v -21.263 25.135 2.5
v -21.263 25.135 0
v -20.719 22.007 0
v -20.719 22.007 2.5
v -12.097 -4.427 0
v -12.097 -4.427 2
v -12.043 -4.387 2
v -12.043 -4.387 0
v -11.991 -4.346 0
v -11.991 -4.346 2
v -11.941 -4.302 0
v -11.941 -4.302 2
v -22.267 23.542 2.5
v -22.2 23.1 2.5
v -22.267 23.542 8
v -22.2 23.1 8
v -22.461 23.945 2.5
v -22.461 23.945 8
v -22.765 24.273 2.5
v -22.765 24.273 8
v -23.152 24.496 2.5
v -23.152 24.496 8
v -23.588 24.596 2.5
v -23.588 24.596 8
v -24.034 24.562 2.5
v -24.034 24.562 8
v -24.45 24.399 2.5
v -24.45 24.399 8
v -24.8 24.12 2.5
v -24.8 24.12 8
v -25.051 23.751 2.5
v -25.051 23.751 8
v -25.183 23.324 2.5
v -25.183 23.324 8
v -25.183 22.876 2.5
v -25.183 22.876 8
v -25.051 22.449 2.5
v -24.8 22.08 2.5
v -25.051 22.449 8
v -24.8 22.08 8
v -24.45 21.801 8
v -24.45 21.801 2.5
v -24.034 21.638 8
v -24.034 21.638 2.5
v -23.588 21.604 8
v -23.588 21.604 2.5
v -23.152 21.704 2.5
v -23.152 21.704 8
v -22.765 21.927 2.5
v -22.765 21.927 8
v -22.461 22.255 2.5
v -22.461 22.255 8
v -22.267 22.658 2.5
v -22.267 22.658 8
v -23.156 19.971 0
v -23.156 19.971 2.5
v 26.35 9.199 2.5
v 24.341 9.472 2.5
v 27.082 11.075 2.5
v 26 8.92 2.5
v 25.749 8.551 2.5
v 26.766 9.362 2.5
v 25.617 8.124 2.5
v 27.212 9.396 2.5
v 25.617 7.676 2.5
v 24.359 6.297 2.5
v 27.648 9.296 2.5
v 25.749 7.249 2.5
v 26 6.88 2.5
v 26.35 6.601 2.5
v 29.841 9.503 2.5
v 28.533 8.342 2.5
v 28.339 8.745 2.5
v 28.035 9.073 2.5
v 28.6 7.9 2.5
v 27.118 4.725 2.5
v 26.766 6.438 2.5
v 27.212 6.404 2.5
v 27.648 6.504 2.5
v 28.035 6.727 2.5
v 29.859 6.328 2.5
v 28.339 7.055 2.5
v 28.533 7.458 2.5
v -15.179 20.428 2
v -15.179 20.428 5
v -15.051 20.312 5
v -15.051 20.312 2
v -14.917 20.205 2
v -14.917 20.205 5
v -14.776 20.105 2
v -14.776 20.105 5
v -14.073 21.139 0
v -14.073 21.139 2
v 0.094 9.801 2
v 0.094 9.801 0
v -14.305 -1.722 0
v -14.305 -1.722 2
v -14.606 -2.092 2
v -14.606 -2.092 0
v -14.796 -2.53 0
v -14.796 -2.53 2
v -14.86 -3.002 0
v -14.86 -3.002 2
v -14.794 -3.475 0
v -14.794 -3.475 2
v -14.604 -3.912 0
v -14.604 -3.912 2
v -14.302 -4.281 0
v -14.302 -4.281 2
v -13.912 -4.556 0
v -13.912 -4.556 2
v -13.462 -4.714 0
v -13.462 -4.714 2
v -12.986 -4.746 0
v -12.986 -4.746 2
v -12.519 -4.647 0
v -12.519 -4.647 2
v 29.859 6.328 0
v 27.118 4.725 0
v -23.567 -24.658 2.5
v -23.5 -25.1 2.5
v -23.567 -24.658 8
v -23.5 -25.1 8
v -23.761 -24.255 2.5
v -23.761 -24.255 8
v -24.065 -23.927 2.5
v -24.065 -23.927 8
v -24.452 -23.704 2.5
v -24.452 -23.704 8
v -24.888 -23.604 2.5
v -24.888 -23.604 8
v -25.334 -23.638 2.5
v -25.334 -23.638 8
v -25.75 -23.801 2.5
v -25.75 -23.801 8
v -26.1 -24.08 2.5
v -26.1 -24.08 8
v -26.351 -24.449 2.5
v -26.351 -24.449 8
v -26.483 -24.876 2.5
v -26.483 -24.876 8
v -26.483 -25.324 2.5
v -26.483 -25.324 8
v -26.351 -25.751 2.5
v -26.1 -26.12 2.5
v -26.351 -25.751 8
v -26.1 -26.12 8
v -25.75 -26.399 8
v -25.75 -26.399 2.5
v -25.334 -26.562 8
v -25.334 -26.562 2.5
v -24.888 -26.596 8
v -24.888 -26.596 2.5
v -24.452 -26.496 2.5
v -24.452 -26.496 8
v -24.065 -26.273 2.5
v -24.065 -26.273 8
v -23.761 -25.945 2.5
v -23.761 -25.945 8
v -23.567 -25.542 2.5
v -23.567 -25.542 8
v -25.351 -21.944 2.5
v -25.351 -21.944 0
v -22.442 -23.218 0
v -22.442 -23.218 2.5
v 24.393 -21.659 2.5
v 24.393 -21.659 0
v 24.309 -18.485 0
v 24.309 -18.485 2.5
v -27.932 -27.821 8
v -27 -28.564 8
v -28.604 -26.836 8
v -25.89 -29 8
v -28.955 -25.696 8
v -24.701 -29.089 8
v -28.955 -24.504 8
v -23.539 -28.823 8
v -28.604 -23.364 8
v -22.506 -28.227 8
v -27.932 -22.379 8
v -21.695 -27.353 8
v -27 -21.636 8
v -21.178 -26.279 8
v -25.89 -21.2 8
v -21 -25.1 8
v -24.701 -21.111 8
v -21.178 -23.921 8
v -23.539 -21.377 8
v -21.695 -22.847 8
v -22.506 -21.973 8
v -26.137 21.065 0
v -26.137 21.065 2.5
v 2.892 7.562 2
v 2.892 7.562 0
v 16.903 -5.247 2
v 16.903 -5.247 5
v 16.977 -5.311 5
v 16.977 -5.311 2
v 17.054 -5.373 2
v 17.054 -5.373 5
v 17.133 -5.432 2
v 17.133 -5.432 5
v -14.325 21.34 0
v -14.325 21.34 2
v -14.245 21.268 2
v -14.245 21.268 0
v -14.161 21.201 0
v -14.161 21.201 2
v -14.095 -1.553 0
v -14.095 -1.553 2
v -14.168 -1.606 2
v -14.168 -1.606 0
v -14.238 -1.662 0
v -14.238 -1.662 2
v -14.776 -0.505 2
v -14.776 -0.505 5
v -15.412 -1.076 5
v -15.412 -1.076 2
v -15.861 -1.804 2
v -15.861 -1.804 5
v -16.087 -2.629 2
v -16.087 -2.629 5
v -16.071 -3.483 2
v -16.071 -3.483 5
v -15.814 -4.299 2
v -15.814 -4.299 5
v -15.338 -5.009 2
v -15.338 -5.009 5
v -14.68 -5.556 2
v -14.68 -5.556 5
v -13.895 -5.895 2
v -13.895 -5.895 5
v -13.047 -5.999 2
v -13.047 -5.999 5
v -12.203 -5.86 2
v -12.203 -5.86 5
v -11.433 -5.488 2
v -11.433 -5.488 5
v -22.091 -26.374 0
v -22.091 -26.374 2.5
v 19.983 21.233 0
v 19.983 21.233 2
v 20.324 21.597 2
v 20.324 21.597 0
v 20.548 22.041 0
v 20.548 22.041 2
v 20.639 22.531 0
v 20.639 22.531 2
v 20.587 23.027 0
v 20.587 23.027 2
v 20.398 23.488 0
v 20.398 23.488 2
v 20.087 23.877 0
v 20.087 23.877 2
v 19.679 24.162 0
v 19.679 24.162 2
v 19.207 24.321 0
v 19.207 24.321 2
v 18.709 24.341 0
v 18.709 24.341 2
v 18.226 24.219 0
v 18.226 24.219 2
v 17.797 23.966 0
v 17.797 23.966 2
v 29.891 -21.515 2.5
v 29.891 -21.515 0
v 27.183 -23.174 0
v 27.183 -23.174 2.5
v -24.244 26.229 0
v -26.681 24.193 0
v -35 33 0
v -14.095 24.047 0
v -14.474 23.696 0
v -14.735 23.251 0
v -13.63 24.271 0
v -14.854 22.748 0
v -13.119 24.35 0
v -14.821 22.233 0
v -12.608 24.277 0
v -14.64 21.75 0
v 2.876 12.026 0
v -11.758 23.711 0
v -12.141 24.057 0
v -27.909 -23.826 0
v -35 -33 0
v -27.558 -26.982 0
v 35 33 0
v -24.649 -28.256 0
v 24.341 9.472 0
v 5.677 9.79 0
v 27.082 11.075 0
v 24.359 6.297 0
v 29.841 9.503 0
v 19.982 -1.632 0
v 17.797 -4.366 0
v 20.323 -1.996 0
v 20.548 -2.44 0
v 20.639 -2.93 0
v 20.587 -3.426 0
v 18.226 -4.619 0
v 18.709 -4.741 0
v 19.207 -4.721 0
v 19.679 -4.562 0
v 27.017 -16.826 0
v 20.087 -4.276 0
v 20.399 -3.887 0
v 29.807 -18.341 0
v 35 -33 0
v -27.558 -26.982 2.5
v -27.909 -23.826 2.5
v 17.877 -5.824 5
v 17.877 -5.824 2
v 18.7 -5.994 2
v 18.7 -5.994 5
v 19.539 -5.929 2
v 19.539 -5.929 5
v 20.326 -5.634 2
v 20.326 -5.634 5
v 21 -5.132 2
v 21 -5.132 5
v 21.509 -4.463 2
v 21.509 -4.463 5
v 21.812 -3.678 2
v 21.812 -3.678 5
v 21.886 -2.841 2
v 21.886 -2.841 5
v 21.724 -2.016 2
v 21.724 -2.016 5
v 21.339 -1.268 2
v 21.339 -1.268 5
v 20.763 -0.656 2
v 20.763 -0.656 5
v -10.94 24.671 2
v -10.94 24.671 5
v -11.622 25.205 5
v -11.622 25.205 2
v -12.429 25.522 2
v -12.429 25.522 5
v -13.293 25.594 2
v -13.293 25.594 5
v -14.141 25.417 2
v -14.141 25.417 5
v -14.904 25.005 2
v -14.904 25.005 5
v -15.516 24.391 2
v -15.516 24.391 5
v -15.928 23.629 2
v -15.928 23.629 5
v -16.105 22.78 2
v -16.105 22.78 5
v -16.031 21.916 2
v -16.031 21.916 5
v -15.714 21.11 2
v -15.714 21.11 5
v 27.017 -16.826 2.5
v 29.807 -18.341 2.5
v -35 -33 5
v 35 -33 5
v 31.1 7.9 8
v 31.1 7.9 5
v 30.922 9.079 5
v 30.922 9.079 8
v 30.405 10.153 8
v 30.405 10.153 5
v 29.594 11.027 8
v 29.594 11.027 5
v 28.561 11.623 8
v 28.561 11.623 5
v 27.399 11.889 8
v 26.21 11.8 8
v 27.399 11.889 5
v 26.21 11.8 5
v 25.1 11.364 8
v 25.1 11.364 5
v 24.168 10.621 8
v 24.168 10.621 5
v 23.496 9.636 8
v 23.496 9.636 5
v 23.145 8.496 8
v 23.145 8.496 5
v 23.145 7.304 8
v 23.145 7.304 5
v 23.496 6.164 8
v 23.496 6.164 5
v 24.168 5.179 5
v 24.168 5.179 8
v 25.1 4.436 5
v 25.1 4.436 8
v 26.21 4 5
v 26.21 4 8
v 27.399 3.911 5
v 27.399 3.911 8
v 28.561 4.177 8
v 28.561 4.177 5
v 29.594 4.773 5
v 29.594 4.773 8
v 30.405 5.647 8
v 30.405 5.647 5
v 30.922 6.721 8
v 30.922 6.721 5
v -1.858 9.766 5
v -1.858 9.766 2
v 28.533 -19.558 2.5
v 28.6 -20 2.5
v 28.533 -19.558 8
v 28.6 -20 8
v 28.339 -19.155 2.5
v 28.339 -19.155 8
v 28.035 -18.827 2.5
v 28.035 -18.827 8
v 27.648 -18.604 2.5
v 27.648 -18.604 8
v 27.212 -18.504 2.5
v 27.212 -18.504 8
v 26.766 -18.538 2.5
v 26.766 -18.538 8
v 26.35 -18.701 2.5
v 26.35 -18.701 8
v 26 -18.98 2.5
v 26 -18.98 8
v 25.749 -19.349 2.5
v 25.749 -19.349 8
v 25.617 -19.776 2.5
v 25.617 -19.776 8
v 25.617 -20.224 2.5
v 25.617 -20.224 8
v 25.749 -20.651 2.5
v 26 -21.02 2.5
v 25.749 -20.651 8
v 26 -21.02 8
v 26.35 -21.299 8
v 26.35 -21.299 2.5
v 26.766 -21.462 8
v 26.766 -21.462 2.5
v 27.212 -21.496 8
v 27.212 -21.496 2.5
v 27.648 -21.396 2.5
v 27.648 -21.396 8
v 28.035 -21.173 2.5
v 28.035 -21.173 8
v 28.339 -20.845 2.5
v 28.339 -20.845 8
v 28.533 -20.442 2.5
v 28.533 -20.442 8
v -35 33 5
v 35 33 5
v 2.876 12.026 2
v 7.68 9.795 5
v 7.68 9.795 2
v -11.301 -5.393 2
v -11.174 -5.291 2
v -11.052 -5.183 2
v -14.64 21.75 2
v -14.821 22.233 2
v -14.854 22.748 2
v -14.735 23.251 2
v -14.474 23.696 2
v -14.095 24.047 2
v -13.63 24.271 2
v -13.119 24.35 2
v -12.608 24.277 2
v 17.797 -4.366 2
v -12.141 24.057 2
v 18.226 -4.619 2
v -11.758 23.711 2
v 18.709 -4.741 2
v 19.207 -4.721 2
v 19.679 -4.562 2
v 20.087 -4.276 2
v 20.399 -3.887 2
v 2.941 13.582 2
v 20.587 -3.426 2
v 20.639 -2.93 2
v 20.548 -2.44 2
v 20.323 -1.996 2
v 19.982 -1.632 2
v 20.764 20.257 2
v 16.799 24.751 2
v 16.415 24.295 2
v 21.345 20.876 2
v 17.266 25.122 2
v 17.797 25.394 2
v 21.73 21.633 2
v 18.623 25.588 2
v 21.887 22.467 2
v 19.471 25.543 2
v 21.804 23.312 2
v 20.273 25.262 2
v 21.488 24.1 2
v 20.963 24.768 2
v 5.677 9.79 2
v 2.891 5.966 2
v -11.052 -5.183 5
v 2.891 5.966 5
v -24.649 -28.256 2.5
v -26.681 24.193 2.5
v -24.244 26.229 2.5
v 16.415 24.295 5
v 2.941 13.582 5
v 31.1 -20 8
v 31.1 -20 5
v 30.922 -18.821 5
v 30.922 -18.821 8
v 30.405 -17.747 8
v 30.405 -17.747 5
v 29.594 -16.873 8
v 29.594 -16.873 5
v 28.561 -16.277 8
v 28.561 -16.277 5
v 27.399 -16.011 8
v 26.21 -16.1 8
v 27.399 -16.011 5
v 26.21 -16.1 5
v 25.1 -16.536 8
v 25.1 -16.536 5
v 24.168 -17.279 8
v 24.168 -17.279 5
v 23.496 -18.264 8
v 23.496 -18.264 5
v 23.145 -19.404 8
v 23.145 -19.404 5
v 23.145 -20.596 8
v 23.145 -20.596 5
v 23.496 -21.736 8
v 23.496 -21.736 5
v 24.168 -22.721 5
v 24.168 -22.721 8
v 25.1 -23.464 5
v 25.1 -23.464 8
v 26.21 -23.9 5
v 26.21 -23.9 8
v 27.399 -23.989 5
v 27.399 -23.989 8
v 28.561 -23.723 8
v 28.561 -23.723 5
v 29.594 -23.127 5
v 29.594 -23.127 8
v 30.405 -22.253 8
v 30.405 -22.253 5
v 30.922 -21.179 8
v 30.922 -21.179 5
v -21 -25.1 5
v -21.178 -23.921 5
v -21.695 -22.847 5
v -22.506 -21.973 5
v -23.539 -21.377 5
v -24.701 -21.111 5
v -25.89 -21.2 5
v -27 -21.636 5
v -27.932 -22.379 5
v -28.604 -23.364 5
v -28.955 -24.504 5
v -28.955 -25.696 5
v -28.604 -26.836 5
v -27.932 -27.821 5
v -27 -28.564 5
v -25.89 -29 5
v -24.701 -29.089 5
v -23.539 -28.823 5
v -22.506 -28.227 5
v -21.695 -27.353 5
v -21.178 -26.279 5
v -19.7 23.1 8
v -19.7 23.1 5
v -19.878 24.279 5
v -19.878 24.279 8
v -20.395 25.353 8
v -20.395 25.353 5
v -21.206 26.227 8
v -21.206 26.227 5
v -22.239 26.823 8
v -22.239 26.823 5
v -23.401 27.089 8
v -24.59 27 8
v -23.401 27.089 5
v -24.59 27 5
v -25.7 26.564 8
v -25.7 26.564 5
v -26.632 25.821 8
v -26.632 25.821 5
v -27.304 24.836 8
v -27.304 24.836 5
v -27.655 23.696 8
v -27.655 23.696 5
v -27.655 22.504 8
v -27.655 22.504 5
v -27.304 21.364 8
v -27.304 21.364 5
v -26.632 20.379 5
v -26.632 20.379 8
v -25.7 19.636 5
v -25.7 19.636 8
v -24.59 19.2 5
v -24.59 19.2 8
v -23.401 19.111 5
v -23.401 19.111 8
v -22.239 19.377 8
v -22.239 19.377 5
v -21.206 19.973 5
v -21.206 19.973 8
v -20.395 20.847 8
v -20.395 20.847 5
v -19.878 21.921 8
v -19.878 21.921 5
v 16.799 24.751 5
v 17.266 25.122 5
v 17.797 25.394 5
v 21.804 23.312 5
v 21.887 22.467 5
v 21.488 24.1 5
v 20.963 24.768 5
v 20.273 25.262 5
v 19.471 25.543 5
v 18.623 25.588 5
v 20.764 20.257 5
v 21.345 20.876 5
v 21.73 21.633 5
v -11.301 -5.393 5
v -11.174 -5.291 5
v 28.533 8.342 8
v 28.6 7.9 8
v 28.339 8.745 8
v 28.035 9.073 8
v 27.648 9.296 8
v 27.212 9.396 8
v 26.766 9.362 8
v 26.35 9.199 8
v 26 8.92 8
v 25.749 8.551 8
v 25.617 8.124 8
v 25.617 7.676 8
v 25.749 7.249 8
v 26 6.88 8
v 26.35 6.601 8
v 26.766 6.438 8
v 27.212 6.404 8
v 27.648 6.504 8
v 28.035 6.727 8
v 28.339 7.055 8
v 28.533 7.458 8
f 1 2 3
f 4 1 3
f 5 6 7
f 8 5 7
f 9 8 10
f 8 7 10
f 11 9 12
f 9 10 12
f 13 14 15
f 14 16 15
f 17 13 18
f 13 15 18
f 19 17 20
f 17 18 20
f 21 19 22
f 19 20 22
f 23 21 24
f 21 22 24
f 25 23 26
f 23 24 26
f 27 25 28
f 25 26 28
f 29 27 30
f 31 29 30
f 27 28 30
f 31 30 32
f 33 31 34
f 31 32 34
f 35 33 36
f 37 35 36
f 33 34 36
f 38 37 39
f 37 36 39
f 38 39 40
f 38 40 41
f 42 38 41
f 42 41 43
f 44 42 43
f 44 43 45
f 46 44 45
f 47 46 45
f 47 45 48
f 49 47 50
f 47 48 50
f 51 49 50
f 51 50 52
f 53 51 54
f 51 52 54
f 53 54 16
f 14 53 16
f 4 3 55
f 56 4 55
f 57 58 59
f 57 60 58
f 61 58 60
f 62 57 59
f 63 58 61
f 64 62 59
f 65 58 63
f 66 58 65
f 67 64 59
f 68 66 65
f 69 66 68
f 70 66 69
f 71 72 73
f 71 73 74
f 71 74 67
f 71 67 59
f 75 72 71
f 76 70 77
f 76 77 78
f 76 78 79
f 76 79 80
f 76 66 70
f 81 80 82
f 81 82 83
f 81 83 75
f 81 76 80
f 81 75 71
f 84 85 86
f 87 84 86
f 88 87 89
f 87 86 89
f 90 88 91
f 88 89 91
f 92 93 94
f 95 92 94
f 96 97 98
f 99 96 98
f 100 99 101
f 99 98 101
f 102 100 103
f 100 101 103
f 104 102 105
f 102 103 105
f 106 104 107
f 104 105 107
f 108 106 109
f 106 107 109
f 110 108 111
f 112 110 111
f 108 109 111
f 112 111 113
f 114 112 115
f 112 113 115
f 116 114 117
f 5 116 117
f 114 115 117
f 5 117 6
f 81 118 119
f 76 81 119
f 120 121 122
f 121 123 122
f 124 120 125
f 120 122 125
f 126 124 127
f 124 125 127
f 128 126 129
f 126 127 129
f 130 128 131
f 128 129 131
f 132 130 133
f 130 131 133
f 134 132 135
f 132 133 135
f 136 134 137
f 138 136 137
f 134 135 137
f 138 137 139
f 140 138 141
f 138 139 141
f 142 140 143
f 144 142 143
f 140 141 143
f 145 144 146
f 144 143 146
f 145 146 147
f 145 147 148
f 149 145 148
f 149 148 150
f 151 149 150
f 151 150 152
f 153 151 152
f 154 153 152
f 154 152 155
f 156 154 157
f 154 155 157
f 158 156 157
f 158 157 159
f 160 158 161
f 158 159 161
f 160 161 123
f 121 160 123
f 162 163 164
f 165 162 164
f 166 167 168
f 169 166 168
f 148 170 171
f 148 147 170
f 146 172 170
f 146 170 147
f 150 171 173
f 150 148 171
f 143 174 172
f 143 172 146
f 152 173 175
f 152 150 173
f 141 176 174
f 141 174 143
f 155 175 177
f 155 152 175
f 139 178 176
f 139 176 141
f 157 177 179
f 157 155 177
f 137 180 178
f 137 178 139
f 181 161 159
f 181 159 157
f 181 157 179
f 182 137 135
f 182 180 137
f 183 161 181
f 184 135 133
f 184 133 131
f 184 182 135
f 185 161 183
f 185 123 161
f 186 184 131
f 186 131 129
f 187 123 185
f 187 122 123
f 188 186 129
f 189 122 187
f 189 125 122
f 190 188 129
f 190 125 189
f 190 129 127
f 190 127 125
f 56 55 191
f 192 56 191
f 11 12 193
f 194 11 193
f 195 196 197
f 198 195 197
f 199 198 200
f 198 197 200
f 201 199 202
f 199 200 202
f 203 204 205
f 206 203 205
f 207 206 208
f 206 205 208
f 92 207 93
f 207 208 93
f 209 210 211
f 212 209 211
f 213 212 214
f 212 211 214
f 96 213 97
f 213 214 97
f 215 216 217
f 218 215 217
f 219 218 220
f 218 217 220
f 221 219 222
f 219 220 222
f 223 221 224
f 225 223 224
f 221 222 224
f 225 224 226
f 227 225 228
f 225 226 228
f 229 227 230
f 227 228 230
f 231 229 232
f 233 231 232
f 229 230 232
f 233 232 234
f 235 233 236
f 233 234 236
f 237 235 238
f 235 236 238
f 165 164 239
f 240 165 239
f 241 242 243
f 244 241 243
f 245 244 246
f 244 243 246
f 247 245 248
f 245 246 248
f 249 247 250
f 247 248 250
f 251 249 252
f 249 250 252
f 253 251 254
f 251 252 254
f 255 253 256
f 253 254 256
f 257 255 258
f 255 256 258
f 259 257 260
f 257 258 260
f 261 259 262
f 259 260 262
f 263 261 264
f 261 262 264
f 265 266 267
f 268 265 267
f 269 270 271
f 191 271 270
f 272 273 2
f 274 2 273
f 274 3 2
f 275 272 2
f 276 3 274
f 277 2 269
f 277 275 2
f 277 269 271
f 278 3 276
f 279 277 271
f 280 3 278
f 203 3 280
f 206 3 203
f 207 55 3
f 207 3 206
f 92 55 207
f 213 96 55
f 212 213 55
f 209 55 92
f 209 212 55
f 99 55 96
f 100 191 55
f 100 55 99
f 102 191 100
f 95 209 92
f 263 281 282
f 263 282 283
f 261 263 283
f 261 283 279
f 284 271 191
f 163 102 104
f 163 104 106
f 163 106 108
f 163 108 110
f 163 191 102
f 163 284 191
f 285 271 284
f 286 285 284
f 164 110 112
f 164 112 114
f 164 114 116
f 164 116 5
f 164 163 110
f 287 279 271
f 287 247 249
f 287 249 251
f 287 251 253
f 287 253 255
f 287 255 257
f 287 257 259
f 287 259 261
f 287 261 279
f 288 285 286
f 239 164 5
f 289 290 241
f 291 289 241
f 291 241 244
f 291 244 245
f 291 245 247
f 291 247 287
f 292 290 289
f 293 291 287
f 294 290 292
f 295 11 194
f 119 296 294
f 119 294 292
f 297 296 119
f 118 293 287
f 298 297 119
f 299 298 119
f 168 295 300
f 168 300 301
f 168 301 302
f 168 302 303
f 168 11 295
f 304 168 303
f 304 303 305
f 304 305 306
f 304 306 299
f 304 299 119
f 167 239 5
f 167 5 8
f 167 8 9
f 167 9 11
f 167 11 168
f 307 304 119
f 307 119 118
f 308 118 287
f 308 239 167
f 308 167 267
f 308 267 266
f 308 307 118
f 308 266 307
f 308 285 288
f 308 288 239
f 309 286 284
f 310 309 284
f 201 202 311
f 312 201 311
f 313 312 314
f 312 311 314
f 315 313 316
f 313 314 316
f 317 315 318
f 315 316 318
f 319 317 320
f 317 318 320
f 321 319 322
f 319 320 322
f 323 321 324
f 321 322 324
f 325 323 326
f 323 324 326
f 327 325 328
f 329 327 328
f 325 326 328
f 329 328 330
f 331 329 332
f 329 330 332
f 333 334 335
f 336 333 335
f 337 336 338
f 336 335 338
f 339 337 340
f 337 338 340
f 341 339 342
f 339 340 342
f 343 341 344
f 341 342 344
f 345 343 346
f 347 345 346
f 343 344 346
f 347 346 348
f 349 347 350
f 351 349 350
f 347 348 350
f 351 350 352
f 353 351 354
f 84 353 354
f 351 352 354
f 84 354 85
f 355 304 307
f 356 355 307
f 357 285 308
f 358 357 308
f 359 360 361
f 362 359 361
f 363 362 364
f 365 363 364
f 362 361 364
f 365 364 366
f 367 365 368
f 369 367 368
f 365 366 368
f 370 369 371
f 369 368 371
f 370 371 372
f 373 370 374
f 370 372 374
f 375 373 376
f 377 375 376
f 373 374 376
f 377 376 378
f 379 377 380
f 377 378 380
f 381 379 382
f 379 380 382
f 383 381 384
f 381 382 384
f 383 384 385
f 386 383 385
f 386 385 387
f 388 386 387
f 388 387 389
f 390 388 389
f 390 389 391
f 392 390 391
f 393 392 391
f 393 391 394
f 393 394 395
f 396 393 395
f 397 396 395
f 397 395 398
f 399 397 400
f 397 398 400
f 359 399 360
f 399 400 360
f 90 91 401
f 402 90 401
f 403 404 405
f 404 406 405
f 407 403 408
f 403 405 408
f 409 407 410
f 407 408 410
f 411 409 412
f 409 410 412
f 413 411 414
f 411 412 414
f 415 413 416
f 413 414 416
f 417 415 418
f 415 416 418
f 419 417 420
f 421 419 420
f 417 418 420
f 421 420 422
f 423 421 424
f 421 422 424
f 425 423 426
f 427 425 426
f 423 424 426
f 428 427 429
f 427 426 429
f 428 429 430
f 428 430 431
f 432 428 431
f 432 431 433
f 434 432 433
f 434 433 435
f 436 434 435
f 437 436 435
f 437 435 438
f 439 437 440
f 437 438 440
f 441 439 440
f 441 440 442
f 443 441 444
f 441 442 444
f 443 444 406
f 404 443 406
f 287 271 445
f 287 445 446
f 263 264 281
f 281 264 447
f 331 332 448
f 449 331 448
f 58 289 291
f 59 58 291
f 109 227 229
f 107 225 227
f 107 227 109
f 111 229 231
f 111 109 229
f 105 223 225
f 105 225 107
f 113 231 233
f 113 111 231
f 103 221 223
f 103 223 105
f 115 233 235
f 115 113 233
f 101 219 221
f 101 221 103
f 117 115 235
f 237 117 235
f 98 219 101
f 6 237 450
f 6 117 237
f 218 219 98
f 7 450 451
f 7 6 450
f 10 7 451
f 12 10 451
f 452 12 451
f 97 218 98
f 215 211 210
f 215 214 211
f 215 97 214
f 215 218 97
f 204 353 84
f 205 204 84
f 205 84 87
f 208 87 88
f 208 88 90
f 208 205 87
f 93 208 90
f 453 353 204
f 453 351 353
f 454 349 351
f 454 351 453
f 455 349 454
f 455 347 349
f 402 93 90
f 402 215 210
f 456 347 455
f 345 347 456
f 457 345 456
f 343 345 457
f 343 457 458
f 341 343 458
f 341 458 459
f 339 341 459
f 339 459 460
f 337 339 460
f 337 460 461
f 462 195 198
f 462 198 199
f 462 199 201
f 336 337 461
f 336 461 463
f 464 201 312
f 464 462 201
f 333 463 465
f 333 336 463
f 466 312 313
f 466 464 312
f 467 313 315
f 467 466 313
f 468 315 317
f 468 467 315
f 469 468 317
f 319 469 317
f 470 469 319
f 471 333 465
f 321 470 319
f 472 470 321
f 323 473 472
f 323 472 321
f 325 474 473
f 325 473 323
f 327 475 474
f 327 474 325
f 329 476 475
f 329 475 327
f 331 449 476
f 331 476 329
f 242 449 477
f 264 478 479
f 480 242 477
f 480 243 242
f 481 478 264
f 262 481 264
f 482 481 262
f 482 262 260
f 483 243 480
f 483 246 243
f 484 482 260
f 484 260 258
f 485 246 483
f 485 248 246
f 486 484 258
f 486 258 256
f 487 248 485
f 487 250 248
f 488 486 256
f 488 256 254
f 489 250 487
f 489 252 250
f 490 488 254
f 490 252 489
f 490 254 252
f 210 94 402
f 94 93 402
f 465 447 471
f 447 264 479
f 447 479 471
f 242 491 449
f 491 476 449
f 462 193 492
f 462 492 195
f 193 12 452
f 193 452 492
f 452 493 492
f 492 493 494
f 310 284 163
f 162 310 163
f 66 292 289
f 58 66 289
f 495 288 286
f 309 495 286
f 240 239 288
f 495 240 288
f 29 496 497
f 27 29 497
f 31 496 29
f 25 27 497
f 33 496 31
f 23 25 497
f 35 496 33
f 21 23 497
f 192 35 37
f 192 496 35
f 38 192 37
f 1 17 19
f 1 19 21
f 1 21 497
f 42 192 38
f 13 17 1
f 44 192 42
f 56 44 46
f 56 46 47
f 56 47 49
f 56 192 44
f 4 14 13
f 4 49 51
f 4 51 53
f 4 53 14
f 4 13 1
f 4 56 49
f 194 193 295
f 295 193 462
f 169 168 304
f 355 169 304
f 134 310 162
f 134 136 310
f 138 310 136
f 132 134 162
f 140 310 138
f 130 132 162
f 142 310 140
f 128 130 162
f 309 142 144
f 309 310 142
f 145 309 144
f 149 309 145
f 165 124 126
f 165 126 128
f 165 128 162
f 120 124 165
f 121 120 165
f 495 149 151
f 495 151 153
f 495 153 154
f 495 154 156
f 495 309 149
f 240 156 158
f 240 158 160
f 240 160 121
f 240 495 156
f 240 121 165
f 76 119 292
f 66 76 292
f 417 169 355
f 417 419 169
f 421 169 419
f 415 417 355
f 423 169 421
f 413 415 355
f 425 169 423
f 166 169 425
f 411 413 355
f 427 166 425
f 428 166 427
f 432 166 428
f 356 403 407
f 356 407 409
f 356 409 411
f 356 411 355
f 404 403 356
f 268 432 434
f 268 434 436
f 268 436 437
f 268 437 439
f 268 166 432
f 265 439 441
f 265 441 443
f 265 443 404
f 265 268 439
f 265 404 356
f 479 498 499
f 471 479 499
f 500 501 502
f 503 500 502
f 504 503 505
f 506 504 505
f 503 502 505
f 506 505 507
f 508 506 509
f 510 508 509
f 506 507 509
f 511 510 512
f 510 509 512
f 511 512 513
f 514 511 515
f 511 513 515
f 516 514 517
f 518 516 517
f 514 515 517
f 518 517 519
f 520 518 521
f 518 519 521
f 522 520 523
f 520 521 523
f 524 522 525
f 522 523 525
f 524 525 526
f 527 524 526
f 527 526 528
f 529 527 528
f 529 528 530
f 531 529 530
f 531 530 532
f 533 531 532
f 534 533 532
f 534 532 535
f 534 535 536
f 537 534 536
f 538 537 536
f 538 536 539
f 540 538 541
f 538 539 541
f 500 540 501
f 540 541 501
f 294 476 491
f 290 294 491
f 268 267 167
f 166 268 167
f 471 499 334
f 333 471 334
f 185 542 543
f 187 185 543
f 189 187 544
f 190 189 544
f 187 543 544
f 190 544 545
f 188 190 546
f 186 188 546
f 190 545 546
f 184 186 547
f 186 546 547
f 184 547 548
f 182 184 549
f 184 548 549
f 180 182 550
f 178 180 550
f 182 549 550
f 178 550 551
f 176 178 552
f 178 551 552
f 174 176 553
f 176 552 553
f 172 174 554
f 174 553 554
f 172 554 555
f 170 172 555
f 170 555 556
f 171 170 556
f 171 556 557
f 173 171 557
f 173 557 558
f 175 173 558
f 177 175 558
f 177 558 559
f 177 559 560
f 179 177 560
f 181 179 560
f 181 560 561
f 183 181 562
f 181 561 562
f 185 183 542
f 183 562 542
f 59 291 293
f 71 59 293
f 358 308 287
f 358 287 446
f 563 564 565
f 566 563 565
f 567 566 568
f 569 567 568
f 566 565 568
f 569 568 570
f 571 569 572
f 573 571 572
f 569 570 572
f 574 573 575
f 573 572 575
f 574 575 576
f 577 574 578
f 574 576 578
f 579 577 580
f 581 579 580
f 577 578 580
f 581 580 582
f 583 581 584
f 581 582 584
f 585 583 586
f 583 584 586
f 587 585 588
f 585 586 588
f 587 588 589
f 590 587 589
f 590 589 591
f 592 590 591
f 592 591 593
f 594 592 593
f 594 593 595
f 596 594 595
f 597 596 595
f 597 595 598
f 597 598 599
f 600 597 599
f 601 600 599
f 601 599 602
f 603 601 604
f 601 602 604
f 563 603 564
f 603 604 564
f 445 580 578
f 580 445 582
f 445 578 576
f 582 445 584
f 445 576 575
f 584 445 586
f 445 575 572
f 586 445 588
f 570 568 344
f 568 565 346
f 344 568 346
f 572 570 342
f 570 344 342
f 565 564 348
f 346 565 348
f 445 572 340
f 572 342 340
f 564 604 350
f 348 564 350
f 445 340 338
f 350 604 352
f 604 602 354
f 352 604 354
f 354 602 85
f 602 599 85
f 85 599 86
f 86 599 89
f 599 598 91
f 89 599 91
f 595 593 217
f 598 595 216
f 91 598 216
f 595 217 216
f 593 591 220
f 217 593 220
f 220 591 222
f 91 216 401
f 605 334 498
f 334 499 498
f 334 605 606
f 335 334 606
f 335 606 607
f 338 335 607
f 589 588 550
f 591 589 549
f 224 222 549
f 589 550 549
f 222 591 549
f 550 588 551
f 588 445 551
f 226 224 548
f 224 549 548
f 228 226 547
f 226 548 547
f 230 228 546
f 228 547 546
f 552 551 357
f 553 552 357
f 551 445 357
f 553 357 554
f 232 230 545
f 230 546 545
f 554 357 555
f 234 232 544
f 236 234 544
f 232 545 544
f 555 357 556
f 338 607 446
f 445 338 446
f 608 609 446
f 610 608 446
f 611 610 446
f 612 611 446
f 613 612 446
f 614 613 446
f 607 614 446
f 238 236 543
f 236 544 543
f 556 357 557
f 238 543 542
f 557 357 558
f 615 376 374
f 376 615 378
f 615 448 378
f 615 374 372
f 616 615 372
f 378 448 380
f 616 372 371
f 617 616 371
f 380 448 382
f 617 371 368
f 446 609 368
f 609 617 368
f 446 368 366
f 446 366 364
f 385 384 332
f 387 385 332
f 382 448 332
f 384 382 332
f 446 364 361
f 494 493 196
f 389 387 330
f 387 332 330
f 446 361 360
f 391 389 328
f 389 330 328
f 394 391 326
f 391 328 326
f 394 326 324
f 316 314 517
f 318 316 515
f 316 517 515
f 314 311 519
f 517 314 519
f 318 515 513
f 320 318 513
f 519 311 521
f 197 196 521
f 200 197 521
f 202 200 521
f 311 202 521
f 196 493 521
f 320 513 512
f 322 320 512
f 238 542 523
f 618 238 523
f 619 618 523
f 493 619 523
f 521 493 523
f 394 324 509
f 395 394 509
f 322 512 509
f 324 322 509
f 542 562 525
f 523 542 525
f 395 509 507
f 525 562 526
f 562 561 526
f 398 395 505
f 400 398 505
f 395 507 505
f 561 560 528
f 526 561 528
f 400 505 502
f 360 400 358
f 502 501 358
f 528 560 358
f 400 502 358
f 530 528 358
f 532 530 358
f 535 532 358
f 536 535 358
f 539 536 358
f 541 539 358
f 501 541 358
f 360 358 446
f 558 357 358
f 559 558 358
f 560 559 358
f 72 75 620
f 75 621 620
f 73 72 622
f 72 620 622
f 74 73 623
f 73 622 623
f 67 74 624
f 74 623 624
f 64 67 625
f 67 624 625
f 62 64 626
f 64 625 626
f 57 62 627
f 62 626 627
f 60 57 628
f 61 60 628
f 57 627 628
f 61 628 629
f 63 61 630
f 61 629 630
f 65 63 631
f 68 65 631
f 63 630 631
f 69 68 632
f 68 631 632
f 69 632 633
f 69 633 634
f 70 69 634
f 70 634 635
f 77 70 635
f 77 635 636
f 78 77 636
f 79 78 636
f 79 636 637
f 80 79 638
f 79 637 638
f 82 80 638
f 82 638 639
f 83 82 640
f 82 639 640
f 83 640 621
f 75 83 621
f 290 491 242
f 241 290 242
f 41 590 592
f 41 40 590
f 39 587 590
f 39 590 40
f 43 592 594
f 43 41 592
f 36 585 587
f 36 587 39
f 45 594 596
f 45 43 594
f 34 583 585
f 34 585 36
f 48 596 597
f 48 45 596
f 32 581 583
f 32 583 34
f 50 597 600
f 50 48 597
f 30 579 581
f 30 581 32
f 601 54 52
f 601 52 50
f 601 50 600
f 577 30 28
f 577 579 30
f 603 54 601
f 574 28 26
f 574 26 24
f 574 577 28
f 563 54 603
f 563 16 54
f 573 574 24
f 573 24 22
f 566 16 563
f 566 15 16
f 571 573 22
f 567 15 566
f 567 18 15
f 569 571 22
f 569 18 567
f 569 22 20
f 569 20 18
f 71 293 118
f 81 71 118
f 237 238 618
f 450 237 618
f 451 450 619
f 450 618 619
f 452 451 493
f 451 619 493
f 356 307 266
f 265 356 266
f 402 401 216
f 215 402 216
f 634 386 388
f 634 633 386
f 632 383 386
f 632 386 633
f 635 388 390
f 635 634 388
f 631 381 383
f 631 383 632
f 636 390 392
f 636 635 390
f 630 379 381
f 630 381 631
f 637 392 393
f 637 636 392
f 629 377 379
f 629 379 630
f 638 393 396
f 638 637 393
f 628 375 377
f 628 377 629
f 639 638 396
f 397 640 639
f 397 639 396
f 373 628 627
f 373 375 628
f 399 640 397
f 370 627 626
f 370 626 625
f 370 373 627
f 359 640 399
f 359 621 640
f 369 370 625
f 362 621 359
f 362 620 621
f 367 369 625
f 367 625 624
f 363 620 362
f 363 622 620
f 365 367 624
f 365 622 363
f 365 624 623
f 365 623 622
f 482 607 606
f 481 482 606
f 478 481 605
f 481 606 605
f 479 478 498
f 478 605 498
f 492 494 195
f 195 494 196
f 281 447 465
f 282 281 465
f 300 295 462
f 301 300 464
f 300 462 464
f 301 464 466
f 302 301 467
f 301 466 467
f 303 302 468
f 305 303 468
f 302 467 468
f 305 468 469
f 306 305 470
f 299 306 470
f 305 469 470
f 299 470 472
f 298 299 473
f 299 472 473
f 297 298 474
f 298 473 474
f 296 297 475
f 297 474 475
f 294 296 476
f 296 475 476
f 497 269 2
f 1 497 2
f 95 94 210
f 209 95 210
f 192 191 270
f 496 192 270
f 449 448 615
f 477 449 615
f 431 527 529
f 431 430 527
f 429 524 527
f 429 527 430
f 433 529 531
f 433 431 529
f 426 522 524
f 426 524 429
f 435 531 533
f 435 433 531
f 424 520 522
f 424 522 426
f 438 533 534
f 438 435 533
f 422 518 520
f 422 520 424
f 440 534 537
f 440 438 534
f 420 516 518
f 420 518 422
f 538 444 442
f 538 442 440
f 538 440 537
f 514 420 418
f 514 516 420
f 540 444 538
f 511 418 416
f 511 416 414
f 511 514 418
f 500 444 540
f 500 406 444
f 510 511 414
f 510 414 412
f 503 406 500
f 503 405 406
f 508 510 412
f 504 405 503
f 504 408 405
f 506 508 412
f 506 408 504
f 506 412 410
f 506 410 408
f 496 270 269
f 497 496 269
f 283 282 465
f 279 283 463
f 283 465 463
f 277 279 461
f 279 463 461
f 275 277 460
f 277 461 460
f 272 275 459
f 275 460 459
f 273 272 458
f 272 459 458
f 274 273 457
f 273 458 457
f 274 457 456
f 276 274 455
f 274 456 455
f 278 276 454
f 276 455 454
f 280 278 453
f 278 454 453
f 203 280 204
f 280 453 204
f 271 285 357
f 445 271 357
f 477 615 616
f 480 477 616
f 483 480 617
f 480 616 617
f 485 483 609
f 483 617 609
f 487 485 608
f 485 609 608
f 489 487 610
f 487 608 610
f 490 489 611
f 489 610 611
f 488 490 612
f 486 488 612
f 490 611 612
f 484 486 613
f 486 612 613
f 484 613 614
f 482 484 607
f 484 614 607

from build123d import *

# Parameters (mm, degrees)
F0_W          = 70
F0_H          = 60
F1_DEPTH      = 5
F2_R          = 4
F3_DEPTH      = 3
F4_R          = 1.5
F5_DEPTH      = 3.001
F5_DEPTH_BACK = 5
F6_DEPTH      = 3
F7_DEPTH      = 3
F9_DEPTH      = 5
F11_DEPTH     = 3
F13_DEPTH     = 2.5


with BuildPart() as f1:
    # F0 (on Top) → F1 (new body)
    with BuildSketch(Plane.XY):
        Rectangle(F0_W, F0_H)
    extrude(amount=F1_DEPTH)

    # F2 (on face) → F3 (join)
    with BuildSketch(Plane.XY.offset(5)):
        with Locations((-23.7, 23.1)):
            Circle(F2_R)
        with Locations((-25, -25.1)):
            Circle(F2_R)
        with Locations((27.1, 7.9)):
            Circle(F2_R)
        with Locations((27.1, -20)):
            Circle(F2_R)
    extrude(amount=F3_DEPTH)

    # F4 (on face) → F5 (cut, two sides)
    with BuildSketch(Plane.XY.offset(5)) as f5_sk:
        with Locations((-23.7, 23.1)):
            Circle(F4_R)
        with Locations((27.1, 7.9)):
            Circle(F4_R)
        with Locations((27.1, -20)):
            Circle(F4_R)
        with Locations((-25, -25.1)):
            Circle(F4_R)
    extrude(amount=F5_DEPTH, mode=Mode.SUBTRACT)
    extrude(f5_sk.sketch, amount=-F5_DEPTH_BACK, mode=Mode.SUBTRACT)

    # F6 (add): a face of the model
    f6_faces = [f1.faces().sort_by_distance(p)[0] for p in [
        (0, -30, 2.5),
    ]]
    extrude(f6_faces, amount=F6_DEPTH)

    # F7 (add): a face of the model
    f7_faces = [f1.faces().sort_by_distance(p)[0] for p in [
        (0, 30, 2.5),
    ]]
    extrude(f7_faces, amount=F7_DEPTH)

    # F8 (on face) → F9 (cut)
    with BuildSketch(Plane.XY.offset(5)):
        with BuildLine():
            Line((-14.3054683646, -1.7219720702), (-14.0948043176, -1.5533969252))
            ThreePointArc((-14.0948043176, -1.5533969252), (-14.2033899748, -1.6336185148), (-14.3054683646, -1.7219720702))
        make_face()
        with BuildLine():
            Line((0.0942490372, 9.8008030979), (-14.0948043176, -1.5533969252))
            Line((-14.0948043176, -1.5533969252), (-14.3054683646, -1.7219720702))
            ThreePointArc((-14.3054683646, -1.7219720702), (-14.4654537532, -4.1069079107), (-12.0966540364, -4.4267550448))
            Line((-12.0966540364, -4.4267550448), (-11.9406668878, -4.3019831308))
            Line((-11.9406668878, -4.3019831308), (2.8915675597, 7.5621114407))
            Line((2.8915675597, 7.5621114407), (17.79653445, -4.3663210058))
            ThreePointArc((17.79653445, -4.3663210058), (20.2569293491, -4.0927049714), (19.9819440544, -1.632462731))
            Line((19.9819440544, -1.632462731), (5.6767092201, 9.7899068663))
            Line((5.6767092201, 9.7899068663), (19.9831212168, 21.2334034958))
            ThreePointArc((19.9831212168, 21.2334034958), (20.2564890013, 23.6932556011), (17.7966100252, 23.9663814852))
            Line((17.7966100252, 23.9663814852), (2.875636553, 12.0264928184))
            Line((2.875636553, 12.0264928184), (-11.7579023913, 23.711004976))
            ThreePointArc((-11.7579023913, 23.711004976), (-14.2972510493, 23.8856651764), (-14.3249394698, 21.3404675134))
            Line((-14.3249394698, 21.3404675134), (-14.0726513096, 21.1385615113))
            Line((-14.0726513096, 21.1385615113), (0.0942490372, 9.8008030979))
        make_face()
        with BuildLine():
            Line((-11.9406668878, -4.3019831308), (-12.0966540364, -4.4267550448))
            ThreePointArc((-12.0966540364, -4.4267550448), (-12.0168787832, -4.3665965042), (-11.9406668878, -4.3019831308))
        make_face()
        with BuildLine():
            ThreePointArc((-14.3249394698, 21.3404675134), (-14.20346555, 21.2336789942), (-14.0726513096, 21.1385615113))
            Line((-14.0726513096, 21.1385615113), (-14.3249394698, 21.3404675134))
        make_face()
    extrude(amount=-F9_DEPTH, mode=Mode.SUBTRACT)

    # F10 (on face) → F11 (cut)
    with BuildSketch(Plane.XY.offset(5)):
        with BuildLine():
            Line((-1.8575315971, 9.7664474073), (-14.7756829148, -0.5049047258))
            ThreePointArc((-14.7756829148, -0.5049047258), (-15.6013647029, -4.6712575855), (-11.433176099, -5.4876216764))
            Line((-11.433176099, -5.4876216764), (-11.0521931213, -5.1829866811))
            Line((-11.0521931213, -5.1829866811), (2.8911088828, 5.9661144314))
            Line((2.8911088828, 5.9661144314), (16.9025515531, -5.2472313346))
            Line((16.9025515531, -5.2472313346), (17.1329612476, -5.431628019))
            ThreePointArc((17.1329612476, -5.431628019), (21.2784372428, -4.8153147212), (20.7625294306, -0.6561498487))
            Line((20.7625294306, -0.6561498487), (7.6801953311, 9.7954806055))
            Line((7.6801953311, 9.7954806055), (20.7635173832, 20.2569394769))
            ThreePointArc((20.7635173832, 20.2569394769), (21.4878080636, 24.1004643496), (17.7966100252, 25.3936532288))
            Line((17.7966100252, 25.3936532288), (16.4145835398, 24.2947900603))
            Line((16.4145835398, 24.2947900603), (2.9409192439, 13.5817439671))
            Line((2.9409192439, 13.5817439671), (-10.9395035381, 24.6709768489))
            ThreePointArc((-10.9395035381, 24.6709768489), (-15.232323279, 24.7203169337), (-15.1789230669, 20.4275457788))
            Line((-15.1789230669, 20.4275457788), (-14.7762238118, 20.1052659041))
            Line((-14.7762238118, 20.1052659041), (-1.8575315971, 9.7664474073))
        make_face()
        with BuildLine():
            Line((-11.0521931213, -5.1829866811), (-11.433176099, -5.4876216764))
            ThreePointArc((-11.433176099, -5.4876216764), (-11.2364826168, -5.3430605231), (-11.0521931213, -5.1829866811))
        make_face()
        with BuildLine():
            ThreePointArc((-15.1789230669, 20.4275457788), (-14.9845123714, 20.2577354186), (-14.7762238118, 20.1052659041))
            Line((-14.7762238118, 20.1052659041), (-15.1789230669, 20.4275457788))
        make_face()
        with BuildLine():
            Line((17.1329612476, -5.431628019), (16.9025515531, -5.2472313346))
            ThreePointArc((16.9025515531, -5.2472313346), (17.0154876286, -5.3422645814), (17.1329612476, -5.431628019))
        make_face()
        with BuildLine():
            ThreePointArc((17.7966100252, 25.3936532288), (17.0229247716, 24.9481972003), (16.4145835398, 24.2947900603))
            Line((16.4145835398, 24.2947900603), (17.7966100252, 25.3936532288))
        make_face()
    extrude(amount=-F11_DEPTH, mode=Mode.SUBTRACT)

    # F12 (on face) → F13 (cut)
    with BuildSketch(Plane(origin=(0, 0, 0), x_dir=(1, 0, 0), z_dir=(0, 0, -1))):
        Polygon((-24.6492034201, 28.2559903506), (-27.5577695278, 26.981793925), (-27.9085661076, 23.8258035744), (-25.3507965799, 21.9440096494), (-22.4422304722, 23.218206075), (-22.0914338924, 26.3741964256), align=None)
        Polygon((27.1832127793, 23.1743359883), (24.3925507836, 21.659232375), (24.3093380043, 18.4848963867), (27.0167872207, 16.8256640117), (29.8074492164, 18.340767625), (29.8906619957, 21.5151036133), align=None)
        Polygon((27.1178128759, -4.7246234814), (24.3589497063, -6.2968853377), (24.3411368304, -9.4722618563), (27.0821871241, -11.0753765186), (29.8410502937, -9.5031146623), (29.8588631696, -6.3277381437), align=None)
        Polygon((-23.1561984645, -19.9714838624), (-26.1374736836, -21.0647959868), (-26.6812752191, -24.1933121244), (-24.2438015355, -26.2285161376), (-21.2625263164, -25.1352040132), (-20.7187247809, -22.0066878756), align=None)
    extrude(amount=-F13_DEPTH, mode=Mode.SUBTRACT)


solid = f1.part
